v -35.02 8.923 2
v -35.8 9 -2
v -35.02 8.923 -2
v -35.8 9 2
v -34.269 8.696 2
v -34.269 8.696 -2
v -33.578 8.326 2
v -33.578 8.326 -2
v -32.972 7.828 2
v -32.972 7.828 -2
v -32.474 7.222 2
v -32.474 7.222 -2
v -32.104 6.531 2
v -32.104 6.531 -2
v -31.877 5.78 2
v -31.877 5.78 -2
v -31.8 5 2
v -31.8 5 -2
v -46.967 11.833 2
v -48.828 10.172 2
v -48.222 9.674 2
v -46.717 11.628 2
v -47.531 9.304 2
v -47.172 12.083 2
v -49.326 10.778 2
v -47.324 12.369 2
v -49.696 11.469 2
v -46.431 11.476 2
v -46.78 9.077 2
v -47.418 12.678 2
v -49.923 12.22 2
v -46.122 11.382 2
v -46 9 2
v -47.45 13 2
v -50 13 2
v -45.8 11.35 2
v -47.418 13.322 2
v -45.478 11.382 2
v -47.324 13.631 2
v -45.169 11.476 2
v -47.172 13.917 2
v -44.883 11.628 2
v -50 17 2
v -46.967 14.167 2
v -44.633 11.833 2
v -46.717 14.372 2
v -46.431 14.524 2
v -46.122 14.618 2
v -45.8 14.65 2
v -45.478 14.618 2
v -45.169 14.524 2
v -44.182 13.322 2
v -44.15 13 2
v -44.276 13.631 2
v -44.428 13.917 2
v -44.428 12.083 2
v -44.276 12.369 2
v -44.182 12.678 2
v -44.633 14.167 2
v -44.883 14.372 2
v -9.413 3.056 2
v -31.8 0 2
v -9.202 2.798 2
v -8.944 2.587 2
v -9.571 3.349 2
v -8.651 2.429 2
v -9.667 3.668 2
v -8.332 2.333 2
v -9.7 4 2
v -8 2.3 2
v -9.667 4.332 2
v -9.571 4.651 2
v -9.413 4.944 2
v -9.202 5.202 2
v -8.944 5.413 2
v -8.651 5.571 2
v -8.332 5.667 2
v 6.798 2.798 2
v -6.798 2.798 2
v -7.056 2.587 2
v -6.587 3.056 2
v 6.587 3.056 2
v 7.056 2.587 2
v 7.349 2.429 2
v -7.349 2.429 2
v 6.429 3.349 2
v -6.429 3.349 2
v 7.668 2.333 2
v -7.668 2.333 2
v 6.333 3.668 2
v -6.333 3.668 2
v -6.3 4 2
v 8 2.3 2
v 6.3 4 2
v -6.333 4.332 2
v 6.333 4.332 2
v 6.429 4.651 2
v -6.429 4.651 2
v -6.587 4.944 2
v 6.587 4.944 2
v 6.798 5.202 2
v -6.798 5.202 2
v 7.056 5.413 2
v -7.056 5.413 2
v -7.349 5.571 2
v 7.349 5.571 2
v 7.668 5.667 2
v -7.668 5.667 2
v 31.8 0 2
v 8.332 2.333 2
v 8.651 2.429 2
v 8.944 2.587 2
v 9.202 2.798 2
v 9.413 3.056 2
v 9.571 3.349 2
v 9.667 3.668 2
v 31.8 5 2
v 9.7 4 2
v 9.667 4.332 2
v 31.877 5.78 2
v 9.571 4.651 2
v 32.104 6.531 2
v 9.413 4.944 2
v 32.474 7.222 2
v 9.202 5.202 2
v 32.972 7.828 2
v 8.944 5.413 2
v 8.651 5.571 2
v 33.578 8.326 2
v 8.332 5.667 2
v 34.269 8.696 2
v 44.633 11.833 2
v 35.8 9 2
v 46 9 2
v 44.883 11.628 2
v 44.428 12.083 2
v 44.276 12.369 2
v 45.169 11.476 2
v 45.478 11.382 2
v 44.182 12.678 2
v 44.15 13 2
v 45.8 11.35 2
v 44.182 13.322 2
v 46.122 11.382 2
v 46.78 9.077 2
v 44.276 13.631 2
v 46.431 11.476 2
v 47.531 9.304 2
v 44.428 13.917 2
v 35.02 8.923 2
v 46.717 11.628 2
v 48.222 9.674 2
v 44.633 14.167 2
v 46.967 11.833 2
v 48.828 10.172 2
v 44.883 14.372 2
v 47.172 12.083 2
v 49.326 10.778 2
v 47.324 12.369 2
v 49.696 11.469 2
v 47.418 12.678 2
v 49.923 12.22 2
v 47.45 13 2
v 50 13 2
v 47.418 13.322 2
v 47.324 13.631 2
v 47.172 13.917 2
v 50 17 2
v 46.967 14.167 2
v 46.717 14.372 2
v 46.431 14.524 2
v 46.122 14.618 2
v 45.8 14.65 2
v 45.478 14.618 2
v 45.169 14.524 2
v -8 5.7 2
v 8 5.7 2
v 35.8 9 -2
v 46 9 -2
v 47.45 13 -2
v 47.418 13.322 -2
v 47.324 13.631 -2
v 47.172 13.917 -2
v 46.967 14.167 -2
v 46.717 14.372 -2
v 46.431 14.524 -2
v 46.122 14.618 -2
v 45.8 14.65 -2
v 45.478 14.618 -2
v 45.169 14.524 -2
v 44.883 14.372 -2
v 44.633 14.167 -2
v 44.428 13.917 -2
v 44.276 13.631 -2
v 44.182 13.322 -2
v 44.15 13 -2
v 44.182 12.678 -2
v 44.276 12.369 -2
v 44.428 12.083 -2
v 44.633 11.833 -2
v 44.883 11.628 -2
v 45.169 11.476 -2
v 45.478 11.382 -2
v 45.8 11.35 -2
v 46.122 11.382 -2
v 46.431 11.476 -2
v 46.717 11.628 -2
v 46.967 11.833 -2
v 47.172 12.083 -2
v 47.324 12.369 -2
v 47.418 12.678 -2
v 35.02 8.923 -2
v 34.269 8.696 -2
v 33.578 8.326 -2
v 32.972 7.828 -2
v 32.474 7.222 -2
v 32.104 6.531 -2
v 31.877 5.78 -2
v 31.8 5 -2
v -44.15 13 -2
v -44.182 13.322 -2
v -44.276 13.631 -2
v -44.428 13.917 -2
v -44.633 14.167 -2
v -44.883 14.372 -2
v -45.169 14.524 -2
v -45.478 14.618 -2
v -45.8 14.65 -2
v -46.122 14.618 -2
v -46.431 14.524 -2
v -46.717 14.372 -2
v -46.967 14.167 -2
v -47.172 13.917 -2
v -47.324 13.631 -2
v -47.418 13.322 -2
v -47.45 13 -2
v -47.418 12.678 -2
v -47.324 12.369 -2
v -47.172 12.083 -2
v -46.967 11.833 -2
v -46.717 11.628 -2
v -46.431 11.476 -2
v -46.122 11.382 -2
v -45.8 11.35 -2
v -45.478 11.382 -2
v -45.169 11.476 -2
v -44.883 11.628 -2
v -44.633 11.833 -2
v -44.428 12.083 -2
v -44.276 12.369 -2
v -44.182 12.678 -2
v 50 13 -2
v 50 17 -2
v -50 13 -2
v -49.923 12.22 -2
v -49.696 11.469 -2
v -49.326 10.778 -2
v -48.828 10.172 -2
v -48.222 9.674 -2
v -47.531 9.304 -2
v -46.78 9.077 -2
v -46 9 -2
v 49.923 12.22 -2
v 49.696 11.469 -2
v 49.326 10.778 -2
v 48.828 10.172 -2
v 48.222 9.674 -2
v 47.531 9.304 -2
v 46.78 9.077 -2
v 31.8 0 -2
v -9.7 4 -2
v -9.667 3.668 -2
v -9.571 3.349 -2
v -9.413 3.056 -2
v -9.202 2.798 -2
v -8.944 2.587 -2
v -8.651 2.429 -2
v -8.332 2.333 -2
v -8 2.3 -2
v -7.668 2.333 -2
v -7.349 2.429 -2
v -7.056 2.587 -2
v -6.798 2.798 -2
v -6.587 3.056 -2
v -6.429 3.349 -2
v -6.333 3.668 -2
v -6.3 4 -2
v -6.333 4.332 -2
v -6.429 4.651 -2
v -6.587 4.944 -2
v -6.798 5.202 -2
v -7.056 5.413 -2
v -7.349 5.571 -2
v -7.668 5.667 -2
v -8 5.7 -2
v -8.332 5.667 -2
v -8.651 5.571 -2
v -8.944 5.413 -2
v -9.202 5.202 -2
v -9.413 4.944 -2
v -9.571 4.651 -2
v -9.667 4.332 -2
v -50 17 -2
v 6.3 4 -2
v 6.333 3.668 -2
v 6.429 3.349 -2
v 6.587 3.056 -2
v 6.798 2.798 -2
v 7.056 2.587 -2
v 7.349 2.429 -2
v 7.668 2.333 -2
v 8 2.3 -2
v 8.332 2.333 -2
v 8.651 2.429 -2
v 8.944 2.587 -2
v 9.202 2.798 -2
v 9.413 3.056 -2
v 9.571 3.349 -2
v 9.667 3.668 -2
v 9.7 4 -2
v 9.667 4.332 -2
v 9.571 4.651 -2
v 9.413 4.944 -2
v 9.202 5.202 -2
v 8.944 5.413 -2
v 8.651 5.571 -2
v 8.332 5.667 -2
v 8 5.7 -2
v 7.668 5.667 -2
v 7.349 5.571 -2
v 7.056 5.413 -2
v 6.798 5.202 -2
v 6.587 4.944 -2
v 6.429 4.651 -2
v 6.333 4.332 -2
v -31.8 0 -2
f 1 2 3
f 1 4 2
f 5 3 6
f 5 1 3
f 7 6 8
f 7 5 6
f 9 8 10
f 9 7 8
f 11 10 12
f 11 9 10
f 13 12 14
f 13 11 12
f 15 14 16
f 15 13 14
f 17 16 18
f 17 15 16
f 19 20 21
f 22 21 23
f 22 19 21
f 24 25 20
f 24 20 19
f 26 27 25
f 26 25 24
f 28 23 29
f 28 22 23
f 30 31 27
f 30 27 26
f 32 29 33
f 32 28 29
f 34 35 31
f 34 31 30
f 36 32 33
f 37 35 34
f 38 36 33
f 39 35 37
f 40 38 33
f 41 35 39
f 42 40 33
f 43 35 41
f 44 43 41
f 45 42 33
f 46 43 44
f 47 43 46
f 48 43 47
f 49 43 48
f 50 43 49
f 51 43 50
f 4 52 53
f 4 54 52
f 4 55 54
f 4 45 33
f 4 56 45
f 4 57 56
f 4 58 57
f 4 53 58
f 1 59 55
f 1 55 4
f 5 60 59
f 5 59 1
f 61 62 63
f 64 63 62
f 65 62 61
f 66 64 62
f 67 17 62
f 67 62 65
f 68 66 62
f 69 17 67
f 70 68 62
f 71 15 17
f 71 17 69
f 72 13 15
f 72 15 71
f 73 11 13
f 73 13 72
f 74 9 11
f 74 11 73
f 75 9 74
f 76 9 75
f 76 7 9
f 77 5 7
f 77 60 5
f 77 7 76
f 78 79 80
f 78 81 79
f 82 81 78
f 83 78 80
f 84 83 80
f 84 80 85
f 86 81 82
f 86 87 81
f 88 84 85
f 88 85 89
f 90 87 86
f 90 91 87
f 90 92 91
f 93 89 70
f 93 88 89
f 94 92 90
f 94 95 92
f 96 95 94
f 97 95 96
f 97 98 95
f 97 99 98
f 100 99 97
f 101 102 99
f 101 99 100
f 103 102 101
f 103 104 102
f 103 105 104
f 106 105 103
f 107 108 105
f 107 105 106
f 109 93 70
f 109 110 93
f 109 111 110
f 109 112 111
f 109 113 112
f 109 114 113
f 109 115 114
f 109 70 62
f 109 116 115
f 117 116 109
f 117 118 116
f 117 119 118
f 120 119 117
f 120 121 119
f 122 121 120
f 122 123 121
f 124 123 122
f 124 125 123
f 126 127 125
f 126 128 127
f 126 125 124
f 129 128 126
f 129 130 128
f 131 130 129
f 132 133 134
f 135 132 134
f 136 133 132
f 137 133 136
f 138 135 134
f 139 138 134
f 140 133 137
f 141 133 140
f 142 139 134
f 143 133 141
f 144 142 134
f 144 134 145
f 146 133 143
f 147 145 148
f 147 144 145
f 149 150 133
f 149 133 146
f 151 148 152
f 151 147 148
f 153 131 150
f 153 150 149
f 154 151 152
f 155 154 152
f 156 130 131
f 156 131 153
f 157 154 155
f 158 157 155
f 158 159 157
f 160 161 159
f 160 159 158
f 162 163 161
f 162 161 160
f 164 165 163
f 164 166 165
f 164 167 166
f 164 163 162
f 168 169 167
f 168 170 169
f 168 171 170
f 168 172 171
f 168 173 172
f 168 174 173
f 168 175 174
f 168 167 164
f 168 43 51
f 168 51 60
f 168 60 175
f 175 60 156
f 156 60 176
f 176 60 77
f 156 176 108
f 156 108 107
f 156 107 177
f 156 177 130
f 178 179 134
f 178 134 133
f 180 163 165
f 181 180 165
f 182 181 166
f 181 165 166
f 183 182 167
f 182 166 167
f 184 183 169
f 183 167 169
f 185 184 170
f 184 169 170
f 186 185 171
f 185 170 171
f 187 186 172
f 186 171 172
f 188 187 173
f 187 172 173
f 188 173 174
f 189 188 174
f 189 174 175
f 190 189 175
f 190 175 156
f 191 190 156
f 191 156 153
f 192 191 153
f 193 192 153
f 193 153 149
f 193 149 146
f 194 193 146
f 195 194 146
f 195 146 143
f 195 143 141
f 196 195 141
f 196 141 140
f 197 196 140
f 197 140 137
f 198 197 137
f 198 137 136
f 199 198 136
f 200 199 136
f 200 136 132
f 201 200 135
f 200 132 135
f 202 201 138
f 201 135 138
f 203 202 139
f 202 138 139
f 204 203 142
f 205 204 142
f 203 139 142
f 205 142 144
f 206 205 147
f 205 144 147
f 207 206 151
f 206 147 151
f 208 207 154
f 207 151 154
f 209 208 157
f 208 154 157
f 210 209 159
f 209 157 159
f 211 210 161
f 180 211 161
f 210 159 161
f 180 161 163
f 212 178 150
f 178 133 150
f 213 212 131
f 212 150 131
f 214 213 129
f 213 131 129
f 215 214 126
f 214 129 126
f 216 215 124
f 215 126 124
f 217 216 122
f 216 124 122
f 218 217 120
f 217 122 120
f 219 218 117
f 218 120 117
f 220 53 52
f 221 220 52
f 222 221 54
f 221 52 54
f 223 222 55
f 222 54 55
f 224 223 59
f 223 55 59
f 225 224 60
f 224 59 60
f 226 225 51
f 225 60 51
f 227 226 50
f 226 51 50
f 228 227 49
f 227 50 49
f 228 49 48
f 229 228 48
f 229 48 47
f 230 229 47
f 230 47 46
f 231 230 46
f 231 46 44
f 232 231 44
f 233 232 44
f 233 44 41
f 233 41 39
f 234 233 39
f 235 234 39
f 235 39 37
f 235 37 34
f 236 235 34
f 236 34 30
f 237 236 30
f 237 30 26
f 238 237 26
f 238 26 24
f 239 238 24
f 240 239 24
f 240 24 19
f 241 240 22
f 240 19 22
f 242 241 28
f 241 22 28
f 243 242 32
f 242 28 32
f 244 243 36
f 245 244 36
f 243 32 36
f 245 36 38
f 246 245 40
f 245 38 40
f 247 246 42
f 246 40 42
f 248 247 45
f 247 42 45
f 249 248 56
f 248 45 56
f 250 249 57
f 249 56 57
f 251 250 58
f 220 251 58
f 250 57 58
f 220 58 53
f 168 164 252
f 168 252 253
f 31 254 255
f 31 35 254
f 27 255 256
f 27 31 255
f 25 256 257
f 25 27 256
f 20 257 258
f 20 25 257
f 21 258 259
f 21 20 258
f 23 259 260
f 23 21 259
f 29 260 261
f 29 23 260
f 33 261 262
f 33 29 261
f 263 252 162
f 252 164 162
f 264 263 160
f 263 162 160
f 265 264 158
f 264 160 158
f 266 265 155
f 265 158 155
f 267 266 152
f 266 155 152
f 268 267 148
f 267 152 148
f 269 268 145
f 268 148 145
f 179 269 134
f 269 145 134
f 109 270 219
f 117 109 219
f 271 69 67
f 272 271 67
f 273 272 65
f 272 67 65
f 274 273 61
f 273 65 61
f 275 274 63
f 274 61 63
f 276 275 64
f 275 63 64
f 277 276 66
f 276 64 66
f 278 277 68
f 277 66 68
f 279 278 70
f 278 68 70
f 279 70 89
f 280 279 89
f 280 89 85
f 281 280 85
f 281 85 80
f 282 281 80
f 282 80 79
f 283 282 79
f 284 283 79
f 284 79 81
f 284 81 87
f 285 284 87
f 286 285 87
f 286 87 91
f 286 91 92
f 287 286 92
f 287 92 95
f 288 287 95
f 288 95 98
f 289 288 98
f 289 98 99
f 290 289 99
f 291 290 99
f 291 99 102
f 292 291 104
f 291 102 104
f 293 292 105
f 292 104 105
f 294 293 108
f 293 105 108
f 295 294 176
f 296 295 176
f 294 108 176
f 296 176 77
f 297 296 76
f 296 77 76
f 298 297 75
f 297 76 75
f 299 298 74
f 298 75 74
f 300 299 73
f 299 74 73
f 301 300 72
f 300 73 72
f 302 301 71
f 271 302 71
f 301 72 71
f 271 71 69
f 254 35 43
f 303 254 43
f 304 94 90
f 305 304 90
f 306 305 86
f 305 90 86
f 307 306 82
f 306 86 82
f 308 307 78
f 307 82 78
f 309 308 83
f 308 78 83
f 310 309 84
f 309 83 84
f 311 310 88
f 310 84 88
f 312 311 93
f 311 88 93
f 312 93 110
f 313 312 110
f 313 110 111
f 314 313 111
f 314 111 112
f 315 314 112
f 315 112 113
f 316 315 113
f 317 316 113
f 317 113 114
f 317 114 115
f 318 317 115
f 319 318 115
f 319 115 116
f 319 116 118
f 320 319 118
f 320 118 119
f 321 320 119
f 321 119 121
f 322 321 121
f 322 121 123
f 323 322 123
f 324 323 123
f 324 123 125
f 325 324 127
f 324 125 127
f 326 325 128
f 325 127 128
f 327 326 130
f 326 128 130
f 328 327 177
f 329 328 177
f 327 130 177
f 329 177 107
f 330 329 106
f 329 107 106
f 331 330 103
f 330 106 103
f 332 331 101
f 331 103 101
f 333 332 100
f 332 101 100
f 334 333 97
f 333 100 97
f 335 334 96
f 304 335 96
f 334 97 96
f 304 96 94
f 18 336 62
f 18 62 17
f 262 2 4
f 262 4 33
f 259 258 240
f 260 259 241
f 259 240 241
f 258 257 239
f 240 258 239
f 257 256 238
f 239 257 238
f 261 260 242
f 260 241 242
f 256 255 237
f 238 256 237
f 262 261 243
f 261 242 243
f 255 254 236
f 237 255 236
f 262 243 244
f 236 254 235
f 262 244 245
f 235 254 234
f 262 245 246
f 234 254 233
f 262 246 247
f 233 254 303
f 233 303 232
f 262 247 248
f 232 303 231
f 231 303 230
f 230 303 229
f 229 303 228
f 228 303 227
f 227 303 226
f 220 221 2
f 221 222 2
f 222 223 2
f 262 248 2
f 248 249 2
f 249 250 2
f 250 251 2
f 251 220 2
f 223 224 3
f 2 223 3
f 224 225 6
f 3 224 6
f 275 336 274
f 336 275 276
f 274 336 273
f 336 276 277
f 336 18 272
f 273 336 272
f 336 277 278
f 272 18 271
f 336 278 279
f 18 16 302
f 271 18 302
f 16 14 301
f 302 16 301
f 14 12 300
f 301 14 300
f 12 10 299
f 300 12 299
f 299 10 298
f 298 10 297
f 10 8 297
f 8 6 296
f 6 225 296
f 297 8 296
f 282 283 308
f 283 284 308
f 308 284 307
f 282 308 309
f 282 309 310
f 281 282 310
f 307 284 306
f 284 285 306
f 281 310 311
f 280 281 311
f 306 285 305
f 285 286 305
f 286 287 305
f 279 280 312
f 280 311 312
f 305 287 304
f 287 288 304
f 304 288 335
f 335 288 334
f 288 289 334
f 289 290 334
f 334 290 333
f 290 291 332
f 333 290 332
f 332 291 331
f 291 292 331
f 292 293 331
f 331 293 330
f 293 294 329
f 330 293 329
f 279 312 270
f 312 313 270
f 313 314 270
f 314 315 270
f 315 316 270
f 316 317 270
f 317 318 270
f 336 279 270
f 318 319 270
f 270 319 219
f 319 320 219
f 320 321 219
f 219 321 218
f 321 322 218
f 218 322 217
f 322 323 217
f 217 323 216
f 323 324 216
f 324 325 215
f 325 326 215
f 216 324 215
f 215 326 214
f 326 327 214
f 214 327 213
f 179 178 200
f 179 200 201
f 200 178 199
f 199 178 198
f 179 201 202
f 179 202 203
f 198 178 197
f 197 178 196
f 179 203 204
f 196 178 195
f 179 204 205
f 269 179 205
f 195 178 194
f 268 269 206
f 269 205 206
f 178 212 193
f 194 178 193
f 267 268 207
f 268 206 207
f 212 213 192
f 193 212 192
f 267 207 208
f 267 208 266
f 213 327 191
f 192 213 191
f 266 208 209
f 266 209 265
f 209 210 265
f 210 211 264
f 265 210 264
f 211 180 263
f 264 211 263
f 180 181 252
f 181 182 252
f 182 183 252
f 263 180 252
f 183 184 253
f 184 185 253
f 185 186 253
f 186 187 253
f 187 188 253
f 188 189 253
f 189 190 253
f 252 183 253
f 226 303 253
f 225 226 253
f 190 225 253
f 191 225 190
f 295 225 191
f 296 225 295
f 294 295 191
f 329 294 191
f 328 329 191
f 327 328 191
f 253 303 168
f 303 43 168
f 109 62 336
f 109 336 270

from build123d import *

# Parameters (mm, degrees)
SKETCH2_W             = 100
SKETCH2_H             = 17
BASE_DEPTH            = 2
M3_CLEARANCE_HOLE1_D  = 3.4
M4X0_7_TAPPED_HOLE1_D = 3.3
SKETCH9_W             = 18.2
SKETCH9_H             = 9
CUT_EXTRUDE1_DEPTH    = 10
FILLET3_R             = 4


with BuildPart() as part:
    # Sketch2 → Base (new body, symmetric)
    with BuildSketch(Plane.XY):
        with Locations((0, 8.5)):
            Rectangle(SKETCH2_W, SKETCH2_H)
    extrude(amount=BASE_DEPTH, both=True)

    # M3 Clearance Hole1 (through all)
    with Locations(Plane(origin=(0, 4, -2), x_dir=(1, 0, 0), z_dir=(0, 0, -1))):
        with Locations((-8, 0), (8, 0)):
            Hole(M3_CLEARANCE_HOLE1_D / 2)

    # M4x0.7 Tapped Hole1 (through all)
    with Locations(Plane(origin=(0, 0, -2), x_dir=(-1, 0, 0), z_dir=(0, 0, -1))):
        with Locations((-45.8, 13), (45.8, 13)):
            Hole(M4X0_7_TAPPED_HOLE1_D / 2)

    # Sketch9 → Cut-Extrude1 (cut)
    with BuildSketch(Plane(origin=(0, 0, -2), x_dir=(-1, 0, 0), z_dir=(0, 0, -1))):
        with Locations((40.9, 4.5)):
            Rectangle(SKETCH9_W, SKETCH9_H)
        with Locations((-40.9, 4.5)):
            Rectangle(SKETCH9_W, SKETCH9_H)
    extrude(amount=-CUT_EXTRUDE1_DEPTH, mode=Mode.SUBTRACT)

    # Fillet3
    fillet3_edges = [part.edges().sort_by_distance(p)[0] for p in [
        (-31.8, 9, 0),
        (-50, 9, 0),
        (50, 9, 0),
        (31.8, 9, 0),
    ]]
    fillet(fillet3_edges, radius=FILLET3_R)


solid = part.part
